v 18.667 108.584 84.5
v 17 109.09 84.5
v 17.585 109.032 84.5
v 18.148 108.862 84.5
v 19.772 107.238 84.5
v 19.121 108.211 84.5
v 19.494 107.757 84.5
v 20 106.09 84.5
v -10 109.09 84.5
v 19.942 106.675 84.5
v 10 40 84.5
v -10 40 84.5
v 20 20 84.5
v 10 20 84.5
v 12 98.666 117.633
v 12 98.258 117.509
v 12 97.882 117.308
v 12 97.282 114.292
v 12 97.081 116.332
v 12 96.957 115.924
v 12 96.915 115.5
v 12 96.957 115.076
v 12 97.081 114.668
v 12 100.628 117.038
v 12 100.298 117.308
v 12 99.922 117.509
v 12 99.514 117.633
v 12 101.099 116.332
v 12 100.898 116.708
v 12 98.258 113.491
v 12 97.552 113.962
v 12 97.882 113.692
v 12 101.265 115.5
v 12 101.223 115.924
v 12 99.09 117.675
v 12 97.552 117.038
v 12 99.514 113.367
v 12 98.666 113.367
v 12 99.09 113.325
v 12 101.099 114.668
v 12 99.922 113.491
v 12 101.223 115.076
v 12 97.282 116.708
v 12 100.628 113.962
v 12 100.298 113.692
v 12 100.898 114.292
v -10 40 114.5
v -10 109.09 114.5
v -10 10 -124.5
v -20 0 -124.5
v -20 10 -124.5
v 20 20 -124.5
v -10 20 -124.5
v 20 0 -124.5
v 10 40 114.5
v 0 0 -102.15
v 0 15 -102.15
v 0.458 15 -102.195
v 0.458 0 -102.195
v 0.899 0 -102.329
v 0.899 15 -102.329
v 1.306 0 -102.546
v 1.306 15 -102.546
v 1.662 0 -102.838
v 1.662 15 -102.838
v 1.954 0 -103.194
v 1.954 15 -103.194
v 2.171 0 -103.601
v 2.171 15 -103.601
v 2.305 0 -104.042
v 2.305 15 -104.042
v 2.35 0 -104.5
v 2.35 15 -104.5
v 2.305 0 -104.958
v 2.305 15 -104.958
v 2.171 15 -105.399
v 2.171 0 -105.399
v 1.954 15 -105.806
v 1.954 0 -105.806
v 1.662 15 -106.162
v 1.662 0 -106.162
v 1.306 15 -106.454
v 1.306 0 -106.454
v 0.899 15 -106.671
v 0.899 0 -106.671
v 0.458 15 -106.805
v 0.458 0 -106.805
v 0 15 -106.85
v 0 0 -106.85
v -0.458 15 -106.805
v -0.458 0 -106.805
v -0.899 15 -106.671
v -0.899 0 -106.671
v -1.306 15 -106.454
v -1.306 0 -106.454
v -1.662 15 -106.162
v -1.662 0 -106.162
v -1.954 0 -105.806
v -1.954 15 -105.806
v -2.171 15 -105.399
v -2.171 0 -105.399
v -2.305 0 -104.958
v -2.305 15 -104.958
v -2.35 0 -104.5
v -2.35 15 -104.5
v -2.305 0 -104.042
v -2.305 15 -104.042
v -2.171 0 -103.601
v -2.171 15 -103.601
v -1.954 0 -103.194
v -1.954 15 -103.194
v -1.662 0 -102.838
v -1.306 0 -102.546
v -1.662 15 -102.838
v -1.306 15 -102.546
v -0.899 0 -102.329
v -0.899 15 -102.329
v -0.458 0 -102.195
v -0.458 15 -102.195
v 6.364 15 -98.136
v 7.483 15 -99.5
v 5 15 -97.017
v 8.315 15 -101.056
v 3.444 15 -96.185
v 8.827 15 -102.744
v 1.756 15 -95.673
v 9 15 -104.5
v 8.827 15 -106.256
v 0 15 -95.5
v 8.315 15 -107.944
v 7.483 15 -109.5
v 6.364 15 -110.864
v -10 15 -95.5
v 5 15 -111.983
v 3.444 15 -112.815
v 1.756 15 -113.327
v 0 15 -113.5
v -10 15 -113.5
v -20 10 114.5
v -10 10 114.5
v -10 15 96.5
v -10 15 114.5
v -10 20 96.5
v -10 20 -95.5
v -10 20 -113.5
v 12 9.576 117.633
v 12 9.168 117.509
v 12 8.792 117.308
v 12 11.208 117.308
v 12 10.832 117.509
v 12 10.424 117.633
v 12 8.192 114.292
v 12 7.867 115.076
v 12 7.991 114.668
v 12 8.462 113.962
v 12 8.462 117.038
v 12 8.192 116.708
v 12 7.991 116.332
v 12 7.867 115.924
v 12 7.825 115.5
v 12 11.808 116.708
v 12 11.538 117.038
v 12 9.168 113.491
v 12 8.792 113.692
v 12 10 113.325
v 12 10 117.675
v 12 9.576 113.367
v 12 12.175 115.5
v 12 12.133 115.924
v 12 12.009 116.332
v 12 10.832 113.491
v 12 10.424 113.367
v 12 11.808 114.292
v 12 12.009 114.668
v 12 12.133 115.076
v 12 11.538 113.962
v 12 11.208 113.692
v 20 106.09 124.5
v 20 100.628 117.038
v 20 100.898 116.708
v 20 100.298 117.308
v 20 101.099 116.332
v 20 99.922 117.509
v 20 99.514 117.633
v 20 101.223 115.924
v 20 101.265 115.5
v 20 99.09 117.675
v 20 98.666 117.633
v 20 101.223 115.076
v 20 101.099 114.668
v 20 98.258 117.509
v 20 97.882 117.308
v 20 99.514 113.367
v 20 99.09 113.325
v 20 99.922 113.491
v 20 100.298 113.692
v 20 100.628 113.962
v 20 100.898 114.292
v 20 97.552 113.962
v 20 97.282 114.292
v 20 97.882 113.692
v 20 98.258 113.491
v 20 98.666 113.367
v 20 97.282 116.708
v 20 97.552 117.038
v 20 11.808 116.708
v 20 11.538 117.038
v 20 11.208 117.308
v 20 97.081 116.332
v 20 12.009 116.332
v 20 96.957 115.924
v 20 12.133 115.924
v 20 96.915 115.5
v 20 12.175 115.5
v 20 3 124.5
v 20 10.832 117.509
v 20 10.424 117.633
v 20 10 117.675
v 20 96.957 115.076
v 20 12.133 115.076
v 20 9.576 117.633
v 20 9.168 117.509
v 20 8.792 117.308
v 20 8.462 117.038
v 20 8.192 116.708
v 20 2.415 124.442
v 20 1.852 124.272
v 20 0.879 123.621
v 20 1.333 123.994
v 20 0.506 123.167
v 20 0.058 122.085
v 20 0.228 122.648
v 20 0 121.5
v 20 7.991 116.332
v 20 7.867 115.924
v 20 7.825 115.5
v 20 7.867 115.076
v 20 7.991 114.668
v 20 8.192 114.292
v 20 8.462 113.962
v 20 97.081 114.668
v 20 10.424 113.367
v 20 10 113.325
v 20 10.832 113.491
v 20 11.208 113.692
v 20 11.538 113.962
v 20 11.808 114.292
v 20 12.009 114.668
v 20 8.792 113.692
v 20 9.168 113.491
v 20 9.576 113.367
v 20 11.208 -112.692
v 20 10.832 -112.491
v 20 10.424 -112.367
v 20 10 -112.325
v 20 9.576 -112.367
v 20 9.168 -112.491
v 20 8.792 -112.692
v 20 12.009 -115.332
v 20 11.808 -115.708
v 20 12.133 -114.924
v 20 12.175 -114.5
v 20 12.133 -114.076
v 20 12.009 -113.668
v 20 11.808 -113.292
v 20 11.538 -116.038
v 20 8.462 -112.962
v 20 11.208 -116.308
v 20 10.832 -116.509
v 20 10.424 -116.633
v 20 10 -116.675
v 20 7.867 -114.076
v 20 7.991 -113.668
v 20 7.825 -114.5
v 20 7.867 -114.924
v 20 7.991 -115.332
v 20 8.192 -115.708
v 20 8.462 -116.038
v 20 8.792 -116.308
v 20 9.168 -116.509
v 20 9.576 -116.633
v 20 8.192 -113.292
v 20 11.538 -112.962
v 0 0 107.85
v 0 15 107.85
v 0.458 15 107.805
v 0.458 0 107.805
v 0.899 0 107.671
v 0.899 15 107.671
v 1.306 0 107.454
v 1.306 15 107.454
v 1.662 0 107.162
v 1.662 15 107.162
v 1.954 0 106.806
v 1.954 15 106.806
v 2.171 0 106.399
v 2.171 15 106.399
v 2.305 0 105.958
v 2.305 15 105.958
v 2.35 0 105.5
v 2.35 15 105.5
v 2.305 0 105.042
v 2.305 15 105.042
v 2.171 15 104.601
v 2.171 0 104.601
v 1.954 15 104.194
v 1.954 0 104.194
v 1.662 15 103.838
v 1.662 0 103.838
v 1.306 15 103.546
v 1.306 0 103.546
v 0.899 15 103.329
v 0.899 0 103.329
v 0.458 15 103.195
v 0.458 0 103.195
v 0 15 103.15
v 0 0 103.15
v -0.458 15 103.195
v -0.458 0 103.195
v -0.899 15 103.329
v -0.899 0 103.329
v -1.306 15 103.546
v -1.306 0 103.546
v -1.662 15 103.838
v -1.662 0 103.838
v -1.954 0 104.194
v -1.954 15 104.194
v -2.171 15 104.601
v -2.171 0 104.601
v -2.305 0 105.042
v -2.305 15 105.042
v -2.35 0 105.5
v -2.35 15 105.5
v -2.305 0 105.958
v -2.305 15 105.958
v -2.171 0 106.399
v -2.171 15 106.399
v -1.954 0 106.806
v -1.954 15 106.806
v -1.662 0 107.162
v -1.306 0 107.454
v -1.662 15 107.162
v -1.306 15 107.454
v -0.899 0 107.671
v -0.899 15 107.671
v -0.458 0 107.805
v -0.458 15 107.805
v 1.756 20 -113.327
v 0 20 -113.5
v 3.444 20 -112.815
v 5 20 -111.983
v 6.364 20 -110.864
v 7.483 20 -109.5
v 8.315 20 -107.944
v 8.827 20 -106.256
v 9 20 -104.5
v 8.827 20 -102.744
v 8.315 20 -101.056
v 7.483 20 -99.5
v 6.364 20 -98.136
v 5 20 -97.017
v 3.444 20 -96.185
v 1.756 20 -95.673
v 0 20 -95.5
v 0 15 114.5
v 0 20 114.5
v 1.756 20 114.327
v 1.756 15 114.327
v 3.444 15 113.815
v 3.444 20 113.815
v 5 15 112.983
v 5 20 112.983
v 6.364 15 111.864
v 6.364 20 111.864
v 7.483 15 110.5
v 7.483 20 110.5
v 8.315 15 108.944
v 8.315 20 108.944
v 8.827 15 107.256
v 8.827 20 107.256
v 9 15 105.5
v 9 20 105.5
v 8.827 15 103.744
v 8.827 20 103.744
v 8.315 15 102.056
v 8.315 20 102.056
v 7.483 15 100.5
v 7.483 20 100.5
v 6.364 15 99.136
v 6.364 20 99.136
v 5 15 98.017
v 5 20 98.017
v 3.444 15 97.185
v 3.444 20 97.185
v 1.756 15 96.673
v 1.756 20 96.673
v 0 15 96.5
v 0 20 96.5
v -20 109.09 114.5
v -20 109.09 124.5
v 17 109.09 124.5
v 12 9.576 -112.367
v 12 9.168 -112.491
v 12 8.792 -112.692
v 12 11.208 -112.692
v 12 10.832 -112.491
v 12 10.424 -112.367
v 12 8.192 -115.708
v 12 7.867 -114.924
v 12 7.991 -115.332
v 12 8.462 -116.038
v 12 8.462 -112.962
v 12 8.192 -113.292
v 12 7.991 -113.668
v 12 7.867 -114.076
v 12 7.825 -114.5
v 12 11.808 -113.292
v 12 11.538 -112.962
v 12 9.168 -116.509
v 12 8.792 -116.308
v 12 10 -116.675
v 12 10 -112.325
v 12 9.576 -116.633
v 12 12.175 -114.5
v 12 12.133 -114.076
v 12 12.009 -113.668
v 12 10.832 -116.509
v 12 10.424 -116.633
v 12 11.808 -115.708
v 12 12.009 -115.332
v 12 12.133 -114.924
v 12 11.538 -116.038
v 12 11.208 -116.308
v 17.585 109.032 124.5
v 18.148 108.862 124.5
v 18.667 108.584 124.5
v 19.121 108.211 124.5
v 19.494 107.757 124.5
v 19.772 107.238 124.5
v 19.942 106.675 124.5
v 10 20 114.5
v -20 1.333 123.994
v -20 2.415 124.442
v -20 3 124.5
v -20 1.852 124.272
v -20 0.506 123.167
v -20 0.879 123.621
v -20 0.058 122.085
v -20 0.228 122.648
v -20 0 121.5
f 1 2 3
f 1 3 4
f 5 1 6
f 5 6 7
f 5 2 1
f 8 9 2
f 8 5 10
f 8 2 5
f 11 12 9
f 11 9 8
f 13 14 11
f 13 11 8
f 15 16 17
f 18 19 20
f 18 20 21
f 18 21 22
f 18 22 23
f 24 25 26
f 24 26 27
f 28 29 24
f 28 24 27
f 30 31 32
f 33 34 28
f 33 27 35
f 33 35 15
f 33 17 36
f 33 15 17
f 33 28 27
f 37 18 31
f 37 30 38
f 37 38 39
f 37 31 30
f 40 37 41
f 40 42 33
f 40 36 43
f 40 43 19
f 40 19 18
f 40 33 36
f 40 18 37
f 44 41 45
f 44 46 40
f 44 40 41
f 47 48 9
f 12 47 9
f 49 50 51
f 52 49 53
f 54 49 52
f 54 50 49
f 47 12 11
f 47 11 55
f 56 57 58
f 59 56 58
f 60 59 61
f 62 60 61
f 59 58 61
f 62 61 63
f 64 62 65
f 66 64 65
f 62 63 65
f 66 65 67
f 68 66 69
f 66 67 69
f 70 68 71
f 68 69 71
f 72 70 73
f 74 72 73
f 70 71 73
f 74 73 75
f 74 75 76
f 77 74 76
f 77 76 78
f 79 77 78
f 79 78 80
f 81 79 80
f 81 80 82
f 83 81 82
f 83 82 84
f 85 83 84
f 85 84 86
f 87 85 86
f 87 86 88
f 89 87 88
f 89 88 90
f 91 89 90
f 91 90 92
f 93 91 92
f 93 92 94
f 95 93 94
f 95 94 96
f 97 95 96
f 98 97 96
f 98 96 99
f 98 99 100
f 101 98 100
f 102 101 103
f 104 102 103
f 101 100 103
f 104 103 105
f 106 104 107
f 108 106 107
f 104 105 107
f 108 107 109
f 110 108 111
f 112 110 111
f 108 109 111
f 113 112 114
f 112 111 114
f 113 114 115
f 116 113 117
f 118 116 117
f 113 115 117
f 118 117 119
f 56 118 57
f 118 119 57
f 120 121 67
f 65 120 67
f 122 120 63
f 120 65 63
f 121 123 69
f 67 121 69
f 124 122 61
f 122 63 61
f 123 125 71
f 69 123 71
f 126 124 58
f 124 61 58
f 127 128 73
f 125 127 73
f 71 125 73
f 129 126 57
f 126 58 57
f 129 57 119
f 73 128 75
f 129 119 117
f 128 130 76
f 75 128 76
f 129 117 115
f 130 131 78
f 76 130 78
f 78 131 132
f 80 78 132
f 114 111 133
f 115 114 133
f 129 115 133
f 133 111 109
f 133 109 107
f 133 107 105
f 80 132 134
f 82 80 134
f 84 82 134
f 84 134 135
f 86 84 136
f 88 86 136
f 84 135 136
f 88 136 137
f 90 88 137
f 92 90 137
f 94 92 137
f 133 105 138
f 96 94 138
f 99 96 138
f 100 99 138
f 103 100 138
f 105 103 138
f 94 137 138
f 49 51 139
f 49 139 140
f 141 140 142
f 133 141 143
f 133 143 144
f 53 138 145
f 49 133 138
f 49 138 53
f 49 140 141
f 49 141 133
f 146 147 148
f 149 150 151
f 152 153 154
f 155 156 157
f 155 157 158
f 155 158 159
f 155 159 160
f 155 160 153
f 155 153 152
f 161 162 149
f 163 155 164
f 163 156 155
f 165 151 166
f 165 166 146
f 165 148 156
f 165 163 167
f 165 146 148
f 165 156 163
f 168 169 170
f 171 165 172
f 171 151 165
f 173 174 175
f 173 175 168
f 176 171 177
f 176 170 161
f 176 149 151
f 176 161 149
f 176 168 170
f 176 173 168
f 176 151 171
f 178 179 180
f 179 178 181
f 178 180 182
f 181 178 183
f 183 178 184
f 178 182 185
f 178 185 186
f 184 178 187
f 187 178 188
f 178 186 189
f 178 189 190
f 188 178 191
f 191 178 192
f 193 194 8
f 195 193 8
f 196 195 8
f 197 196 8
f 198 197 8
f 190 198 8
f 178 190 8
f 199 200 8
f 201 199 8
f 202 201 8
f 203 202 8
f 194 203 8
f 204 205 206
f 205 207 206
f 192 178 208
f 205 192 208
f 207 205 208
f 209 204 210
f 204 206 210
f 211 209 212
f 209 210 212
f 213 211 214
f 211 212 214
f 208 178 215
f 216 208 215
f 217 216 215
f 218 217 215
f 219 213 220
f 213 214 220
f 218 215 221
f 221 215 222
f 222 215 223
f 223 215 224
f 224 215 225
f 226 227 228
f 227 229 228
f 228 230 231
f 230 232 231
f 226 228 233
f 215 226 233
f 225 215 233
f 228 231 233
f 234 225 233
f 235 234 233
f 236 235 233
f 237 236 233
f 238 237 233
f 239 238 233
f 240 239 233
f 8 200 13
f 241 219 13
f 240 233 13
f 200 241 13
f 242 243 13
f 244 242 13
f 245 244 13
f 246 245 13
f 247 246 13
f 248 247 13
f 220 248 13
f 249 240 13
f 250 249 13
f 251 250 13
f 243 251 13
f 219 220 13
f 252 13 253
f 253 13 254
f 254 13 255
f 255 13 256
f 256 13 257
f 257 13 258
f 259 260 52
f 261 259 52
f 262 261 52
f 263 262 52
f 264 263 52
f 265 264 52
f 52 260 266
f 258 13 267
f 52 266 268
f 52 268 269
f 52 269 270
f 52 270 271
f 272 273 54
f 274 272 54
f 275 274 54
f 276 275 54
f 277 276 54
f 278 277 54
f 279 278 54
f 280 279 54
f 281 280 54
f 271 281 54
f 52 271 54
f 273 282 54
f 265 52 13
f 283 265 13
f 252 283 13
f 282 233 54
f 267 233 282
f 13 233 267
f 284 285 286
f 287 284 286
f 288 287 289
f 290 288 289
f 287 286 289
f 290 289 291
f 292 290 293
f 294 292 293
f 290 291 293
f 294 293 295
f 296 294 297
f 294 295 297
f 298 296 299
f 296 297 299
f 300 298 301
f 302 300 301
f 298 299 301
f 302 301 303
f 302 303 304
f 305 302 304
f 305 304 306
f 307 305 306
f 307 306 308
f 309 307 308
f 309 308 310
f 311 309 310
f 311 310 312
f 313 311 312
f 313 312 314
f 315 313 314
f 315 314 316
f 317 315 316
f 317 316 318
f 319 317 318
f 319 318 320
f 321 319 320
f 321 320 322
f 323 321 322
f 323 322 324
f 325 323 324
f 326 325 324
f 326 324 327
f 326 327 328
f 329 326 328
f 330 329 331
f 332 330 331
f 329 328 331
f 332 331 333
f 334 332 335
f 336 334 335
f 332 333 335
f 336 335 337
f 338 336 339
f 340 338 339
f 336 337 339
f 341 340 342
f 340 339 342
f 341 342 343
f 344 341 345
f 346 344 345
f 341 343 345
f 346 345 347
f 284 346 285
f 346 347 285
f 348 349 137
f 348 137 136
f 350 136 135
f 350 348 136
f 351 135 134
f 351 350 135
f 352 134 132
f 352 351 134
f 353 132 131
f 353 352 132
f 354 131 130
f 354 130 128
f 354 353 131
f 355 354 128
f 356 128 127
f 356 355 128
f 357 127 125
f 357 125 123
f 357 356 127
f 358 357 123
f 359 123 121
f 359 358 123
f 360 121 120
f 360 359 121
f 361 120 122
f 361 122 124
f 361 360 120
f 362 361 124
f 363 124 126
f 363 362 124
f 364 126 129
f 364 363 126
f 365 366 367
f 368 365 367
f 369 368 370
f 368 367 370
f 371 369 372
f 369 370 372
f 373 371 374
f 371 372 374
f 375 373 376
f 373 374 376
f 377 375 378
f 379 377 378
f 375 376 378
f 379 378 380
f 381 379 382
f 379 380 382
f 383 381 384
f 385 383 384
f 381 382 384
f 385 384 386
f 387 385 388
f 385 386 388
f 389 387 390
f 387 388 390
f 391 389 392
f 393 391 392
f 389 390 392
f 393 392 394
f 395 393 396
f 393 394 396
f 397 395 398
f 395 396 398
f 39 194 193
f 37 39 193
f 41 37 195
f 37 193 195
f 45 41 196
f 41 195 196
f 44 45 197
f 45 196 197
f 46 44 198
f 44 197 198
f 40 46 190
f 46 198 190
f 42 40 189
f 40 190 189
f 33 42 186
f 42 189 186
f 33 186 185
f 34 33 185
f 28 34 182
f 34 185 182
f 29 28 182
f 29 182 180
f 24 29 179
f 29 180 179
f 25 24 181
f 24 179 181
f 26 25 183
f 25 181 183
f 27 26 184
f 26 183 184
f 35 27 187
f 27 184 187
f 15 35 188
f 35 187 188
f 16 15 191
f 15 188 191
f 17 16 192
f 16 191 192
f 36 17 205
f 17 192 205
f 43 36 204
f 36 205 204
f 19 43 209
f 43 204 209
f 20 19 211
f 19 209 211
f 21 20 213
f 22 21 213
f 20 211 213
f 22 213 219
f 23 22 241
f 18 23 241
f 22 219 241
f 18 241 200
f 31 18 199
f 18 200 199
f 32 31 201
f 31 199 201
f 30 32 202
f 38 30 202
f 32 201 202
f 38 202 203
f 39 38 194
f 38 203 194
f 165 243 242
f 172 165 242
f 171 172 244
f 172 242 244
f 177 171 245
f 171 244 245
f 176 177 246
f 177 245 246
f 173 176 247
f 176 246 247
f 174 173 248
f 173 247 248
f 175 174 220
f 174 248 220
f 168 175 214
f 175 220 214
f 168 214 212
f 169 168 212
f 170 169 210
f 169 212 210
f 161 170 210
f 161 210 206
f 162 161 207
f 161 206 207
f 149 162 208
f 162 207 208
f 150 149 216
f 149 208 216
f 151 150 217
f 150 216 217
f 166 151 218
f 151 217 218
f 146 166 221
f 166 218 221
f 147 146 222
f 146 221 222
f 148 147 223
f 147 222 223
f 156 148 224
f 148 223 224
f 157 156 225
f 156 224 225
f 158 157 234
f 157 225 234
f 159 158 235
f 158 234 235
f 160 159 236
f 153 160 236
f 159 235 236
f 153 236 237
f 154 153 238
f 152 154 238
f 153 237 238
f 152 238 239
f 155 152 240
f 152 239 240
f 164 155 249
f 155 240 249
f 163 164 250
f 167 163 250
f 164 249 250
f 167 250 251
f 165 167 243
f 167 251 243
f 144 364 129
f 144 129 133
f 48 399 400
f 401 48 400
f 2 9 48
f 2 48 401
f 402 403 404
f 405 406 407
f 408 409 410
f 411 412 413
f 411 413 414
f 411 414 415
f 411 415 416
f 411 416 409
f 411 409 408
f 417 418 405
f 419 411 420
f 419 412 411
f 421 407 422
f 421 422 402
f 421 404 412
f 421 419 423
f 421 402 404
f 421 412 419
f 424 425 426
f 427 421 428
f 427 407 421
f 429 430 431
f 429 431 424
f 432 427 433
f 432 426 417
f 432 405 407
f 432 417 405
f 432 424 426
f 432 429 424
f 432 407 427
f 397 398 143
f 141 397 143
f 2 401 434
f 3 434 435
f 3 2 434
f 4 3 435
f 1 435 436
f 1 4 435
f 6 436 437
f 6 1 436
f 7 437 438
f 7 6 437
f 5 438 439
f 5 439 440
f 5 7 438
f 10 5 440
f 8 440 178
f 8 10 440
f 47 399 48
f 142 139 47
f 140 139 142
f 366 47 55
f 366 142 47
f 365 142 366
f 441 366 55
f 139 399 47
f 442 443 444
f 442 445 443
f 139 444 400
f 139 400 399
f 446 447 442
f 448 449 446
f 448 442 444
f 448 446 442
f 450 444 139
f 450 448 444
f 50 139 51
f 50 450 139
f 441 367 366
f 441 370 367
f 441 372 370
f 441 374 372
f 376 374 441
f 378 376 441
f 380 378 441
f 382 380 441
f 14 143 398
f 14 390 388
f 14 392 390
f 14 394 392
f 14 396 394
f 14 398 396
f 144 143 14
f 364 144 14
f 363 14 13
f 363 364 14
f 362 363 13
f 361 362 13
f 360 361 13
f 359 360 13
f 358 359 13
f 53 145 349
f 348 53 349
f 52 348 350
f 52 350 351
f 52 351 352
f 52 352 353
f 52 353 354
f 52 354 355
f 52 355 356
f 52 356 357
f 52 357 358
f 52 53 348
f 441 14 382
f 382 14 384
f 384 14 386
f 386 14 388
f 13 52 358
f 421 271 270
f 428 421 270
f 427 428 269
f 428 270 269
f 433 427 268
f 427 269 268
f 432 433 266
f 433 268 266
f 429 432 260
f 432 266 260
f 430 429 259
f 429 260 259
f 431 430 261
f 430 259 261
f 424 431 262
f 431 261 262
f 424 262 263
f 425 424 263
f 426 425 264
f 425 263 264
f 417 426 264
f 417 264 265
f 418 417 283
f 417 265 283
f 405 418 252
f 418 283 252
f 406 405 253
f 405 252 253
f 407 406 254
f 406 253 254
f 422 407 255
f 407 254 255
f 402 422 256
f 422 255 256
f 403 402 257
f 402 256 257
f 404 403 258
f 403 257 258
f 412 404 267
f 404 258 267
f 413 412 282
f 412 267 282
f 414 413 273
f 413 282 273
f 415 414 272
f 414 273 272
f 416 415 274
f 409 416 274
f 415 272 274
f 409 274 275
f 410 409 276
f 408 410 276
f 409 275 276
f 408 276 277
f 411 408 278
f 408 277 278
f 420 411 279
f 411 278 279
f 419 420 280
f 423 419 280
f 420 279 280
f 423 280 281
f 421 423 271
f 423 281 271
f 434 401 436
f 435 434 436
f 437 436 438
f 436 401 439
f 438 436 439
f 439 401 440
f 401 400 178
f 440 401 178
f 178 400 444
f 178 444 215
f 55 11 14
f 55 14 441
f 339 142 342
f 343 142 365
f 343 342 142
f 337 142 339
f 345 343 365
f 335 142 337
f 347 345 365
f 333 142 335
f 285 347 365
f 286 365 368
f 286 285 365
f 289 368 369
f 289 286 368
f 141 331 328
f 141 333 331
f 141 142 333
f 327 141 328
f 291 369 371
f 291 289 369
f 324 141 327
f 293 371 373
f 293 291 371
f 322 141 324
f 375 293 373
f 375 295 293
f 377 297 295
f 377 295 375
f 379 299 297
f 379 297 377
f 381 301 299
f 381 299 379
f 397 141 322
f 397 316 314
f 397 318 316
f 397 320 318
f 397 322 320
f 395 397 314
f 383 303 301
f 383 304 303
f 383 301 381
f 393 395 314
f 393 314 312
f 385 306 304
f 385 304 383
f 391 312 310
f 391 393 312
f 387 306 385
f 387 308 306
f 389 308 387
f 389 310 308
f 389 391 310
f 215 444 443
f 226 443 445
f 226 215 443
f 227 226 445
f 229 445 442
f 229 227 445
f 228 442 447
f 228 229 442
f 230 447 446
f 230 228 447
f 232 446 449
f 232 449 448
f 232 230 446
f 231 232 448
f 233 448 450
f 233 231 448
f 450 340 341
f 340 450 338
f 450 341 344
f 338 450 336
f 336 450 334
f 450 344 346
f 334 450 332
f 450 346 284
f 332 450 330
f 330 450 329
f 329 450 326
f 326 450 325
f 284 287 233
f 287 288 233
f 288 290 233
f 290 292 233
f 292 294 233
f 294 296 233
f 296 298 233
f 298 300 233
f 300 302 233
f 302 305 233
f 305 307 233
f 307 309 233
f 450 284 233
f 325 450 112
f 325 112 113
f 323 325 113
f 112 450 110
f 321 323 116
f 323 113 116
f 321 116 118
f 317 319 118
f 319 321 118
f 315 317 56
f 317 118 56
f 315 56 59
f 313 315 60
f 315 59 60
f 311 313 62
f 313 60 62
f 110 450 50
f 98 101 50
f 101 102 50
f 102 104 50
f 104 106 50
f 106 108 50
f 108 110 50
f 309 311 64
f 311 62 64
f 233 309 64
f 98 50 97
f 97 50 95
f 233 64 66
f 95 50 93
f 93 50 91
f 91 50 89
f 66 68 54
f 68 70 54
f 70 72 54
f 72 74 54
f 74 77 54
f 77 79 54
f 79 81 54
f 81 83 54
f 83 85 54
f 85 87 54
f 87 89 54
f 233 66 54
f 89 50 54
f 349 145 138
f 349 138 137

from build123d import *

# Parameters (mm, degrees)
SKETCH1_W               = 40
SKETCH1_H               = 249
BOSS_EXTRUDE1_DEPTH     = 20
SKETCH2_W               = 40
SKETCH2_H               = 40
BOSS_EXTRUDE2_DEPTH     = 89.09
CUT_EXTRUDE1_DEPTH      = 100
CUT_EXTRUDE1_DEPTH_BACK = 10
SKETCH3_W               = 10
SKETCH3_H               = 239
SKETCH6_W               = 30
SKETCH6_H               = 20
CUT_EXTRUDE4_DEPTH      = 20
SKETCH4_R               = 2.35
CUT_EXTRUDE2_DEPTH      = 23
CUT_EXTRUDE3_DEPTH      = 5
SKETCH7_R               = 2.175
CUT_EXTRUDE5_DEPTH      = 8
FILLET1_R               = 3


with BuildPart() as part:
    # Sketch1 → Boss-Extrude1 (new body)
    with BuildSketch(Plane(origin=(0, 0, 0), x_dir=(1, 0, 0), z_dir=(0, 1, 0))):
        Rectangle(SKETCH1_W, SKETCH1_H)
    extrude(amount=BOSS_EXTRUDE1_DEPTH)

    # Sketch2 → Boss-Extrude2 (add)
    with BuildSketch(Plane(origin=(0, 20, 0), x_dir=(1, 0, 0), z_dir=(0, 1, 0))):
        with Locations((0, -104.5)):
            Rectangle(SKETCH2_W, SKETCH2_H)
    extrude(amount=BOSS_EXTRUDE2_DEPTH)

    # Sketch3 → Cut-Extrude1 (cut, two sides: drawn at the far end of the back side and taken through both)
    with BuildSketch(Plane(origin=(0, 20, 0), x_dir=(1, 0, 0), z_dir=(0, 1, 0)).offset(-CUT_EXTRUDE1_DEPTH_BACK)):
        with Locations((-15, 5)):
            Rectangle(SKETCH3_W, SKETCH3_H)
    extrude(amount=CUT_EXTRUDE1_DEPTH + CUT_EXTRUDE1_DEPTH_BACK, mode=Mode.SUBTRACT)

    # Sketch6 → Cut-Extrude4 (cut)
    with BuildSketch(Plane.ZY.offset(10)):
        with Locations((99.5, 30)):
            Rectangle(SKETCH6_W, SKETCH6_H)
    extrude(amount=-CUT_EXTRUDE4_DEPTH, mode=Mode.SUBTRACT)

    # Sketch4 → Cut-Extrude2 (cut)
    with BuildSketch(Plane(origin=(0, 20, 0), x_dir=(1, 0, 0), z_dir=(0, 1, 0))):
        with Locations(Location((0, 104.5, 0), (0, 0, 270))):
            Circle(SKETCH4_R)
        with Locations(Location((0, -105.5, 0), (0, 0, 270))):
            Circle(SKETCH4_R)
    extrude(amount=-CUT_EXTRUDE2_DEPTH, mode=Mode.SUBTRACT)

    # Sketch5 → Cut-Extrude3 (cut)
    with BuildSketch(Plane(origin=(0, 20, 0), x_dir=(1, 0, 0), z_dir=(0, 1, 0))):
        with BuildLine():
            Line((0, 95.5), (-10, 95.5))
            Line((-10, 95.5), (-10, 113.5))
            Line((-10, 113.5), (0, 113.5))
            ThreePointArc((0, 113.5), (9, 104.5), (0, 95.5))
        make_face()
        with BuildLine():
            Line((0, -96.5), (-20, -96.5))
            Line((-20, -96.5), (-20, -114.5))
            Line((-20, -114.5), (0, -114.5))
            ThreePointArc((0, -114.5), (9, -105.5), (0, -96.5))
        make_face()
    extrude(amount=-CUT_EXTRUDE3_DEPTH, mode=Mode.SUBTRACT)

    # Sketch7 → Cut-Extrude5 (cut)
    with BuildSketch(Plane(origin=(20, 0, 0), x_dir=(0, 0, -1), z_dir=(1, 0, 0))):
        with Locations((114.5, 10)):
            Circle(SKETCH7_R)
        with Locations((-115.5, 10)):
            Circle(SKETCH7_R)
        with Locations((-115.5, 99.09)):
            Circle(SKETCH7_R)
    extrude(amount=-CUT_EXTRUDE5_DEPTH, mode=Mode.SUBTRACT)

    # Fillet1
    fillet1_edges = [part.edges().sort_by_distance(p)[0] for p in [
        (20, 109.09, 104.5),
        (0, 0, 124.5),
    ]]
    fillet(fillet1_edges, radius=FILLET1_R)


solid = part.part
